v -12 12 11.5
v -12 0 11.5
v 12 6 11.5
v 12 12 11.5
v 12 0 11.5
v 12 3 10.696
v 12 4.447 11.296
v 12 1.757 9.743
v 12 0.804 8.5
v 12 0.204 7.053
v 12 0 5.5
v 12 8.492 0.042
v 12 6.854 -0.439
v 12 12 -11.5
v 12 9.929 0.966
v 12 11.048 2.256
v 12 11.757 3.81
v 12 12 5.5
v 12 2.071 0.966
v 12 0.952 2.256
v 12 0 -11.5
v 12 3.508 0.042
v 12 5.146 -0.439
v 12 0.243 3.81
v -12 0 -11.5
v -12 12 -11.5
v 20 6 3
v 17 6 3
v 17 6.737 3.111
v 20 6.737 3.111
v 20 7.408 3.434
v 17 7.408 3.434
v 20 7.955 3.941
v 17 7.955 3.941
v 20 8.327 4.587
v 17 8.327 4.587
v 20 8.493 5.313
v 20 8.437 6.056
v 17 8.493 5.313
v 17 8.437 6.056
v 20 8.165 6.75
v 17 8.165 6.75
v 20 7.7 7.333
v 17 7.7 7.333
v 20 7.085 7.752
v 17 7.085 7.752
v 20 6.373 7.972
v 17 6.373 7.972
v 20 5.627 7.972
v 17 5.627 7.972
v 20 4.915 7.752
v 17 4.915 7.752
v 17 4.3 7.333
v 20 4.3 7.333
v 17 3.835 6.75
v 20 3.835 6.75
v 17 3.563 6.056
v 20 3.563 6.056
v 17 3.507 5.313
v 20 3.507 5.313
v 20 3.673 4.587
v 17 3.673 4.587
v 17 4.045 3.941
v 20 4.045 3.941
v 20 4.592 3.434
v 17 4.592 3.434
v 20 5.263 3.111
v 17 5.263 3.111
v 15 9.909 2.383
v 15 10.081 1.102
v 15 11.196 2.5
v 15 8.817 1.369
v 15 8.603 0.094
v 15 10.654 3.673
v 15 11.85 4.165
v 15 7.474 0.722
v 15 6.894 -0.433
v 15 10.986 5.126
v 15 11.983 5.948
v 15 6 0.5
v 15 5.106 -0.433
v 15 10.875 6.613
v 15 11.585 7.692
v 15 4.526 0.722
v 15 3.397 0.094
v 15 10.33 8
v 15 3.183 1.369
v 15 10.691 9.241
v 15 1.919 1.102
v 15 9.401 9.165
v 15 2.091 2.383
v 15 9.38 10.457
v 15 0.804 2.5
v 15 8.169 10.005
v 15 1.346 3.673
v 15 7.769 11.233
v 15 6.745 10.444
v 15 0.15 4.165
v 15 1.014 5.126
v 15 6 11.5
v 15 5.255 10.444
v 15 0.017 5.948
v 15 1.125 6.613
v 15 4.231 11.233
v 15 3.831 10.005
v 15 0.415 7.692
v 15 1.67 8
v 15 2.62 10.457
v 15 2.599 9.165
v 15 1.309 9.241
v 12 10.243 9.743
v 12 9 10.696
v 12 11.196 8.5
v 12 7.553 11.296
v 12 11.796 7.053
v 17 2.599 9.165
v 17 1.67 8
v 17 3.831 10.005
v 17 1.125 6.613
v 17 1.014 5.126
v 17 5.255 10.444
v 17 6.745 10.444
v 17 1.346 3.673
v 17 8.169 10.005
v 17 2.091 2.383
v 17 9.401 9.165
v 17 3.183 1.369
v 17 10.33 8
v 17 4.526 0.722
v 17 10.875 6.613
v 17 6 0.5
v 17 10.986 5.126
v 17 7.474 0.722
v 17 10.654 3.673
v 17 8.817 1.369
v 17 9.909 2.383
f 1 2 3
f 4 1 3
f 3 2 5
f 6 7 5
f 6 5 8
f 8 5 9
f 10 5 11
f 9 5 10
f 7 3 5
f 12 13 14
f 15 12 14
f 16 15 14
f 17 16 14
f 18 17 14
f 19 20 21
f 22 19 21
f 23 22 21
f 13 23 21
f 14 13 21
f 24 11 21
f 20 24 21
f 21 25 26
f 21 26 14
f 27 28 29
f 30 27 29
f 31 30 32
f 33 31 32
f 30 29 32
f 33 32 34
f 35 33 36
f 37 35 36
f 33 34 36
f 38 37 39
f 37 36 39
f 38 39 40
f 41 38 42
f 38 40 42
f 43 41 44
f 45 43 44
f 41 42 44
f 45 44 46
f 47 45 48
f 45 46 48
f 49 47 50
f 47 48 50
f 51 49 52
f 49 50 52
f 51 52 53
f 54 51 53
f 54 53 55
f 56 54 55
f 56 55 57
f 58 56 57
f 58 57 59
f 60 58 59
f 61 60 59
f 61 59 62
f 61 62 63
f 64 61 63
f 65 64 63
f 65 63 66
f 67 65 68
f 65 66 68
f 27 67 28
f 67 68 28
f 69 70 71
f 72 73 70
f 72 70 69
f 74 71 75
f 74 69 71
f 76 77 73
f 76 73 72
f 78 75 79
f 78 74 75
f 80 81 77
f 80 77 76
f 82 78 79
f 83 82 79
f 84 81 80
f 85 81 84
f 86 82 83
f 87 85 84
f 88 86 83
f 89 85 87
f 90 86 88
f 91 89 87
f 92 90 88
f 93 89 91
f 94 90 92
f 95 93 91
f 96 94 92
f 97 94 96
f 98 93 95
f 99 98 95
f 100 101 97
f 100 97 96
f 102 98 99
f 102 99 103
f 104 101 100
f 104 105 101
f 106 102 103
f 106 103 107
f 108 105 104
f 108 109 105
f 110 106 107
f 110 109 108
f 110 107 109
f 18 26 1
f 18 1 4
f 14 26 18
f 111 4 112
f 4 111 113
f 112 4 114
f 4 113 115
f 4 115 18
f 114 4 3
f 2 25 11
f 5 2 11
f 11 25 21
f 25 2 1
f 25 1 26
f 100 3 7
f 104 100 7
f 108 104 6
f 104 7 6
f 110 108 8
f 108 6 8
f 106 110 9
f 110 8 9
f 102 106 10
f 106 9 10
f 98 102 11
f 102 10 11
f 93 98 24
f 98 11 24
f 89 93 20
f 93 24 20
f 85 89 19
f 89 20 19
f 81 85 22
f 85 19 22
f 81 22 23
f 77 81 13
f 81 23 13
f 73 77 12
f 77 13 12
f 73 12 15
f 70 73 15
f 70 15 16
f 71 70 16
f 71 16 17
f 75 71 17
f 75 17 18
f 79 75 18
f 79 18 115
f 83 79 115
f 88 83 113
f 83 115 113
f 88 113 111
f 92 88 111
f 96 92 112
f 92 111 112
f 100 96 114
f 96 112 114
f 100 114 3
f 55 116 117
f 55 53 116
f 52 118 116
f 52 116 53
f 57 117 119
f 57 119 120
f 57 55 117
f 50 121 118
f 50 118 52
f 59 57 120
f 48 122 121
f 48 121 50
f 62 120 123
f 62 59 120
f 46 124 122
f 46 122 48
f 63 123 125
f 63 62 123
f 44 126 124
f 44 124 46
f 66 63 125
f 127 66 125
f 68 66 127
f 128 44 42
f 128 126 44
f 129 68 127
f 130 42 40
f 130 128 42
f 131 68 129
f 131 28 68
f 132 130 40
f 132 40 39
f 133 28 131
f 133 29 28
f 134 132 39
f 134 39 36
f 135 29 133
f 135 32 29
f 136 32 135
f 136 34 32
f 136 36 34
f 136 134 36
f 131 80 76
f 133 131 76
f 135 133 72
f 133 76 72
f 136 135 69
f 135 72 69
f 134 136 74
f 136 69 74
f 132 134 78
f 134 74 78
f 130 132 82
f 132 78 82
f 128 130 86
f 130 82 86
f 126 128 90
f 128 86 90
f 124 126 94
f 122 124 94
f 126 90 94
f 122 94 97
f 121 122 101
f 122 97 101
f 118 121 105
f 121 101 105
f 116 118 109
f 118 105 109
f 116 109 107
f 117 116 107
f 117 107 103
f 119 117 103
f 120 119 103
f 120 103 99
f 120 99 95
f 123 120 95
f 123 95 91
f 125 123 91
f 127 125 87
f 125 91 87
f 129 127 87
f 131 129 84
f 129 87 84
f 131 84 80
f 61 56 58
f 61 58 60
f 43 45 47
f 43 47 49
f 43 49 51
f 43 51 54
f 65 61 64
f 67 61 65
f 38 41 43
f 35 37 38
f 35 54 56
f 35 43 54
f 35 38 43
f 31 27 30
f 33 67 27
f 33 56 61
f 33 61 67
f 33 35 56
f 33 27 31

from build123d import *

# Parameters (mm, degrees)
SCHIZZO1_W                   = 24
SCHIZZO1_H                   = 23
CORPOCENTRALE_DEPTH          = 12
SCHIZZO2_R                   = 6
ESTRUSIONE_ESTRUSIONE2_DEPTH = 3
SCHIZZO3_R                   = 5
ESTRUSIONE_ESTRUSIONE3_DEPTH = 2
SCHIZZO4_R                   = 2.5
ESTRUSIONE_ESTRUSIONE4_DEPTH = 3


with BuildPart() as part:
    # Schizzo1 → CorpoCentrale (new body)
    with BuildSketch(Plane(origin=(0, 0, 0), x_dir=(1, 0, 0), z_dir=(0, 1, 0))):
        Rectangle(SCHIZZO1_W, SCHIZZO1_H)
    extrude(amount=CORPOCENTRALE_DEPTH)

    # Schizzo2 → Estrusione-Estrusione2 (add)
    with BuildSketch(Plane(origin=(12, 0, 0), x_dir=(0, 0, -1), z_dir=(1, 0, 0))):
        with Locations(Location((-5.5, 6, 0), (0, 0, 180))):
            Circle(SCHIZZO2_R)
    extrude(amount=ESTRUSIONE_ESTRUSIONE2_DEPTH)

    # Schizzo3 → Estrusione-Estrusione3 (add)
    with BuildSketch(Plane(origin=(15, 0, 0), x_dir=(0, 0, -1), z_dir=(1, 0, 0))):
        with Locations((-5.5, 6)):
            Circle(SCHIZZO3_R)
    extrude(amount=ESTRUSIONE_ESTRUSIONE3_DEPTH)

    # Schizzo4 → Estrusione-Estrusione4 (add)
    with BuildSketch(Plane(origin=(17, 0, 0), x_dir=(0, 0, -1), z_dir=(1, 0, 0))):
        with Locations((-5.5, 6)):
            Circle(SCHIZZO4_R)
    extrude(amount=ESTRUSIONE_ESTRUSIONE4_DEPTH)


solid = part.part
